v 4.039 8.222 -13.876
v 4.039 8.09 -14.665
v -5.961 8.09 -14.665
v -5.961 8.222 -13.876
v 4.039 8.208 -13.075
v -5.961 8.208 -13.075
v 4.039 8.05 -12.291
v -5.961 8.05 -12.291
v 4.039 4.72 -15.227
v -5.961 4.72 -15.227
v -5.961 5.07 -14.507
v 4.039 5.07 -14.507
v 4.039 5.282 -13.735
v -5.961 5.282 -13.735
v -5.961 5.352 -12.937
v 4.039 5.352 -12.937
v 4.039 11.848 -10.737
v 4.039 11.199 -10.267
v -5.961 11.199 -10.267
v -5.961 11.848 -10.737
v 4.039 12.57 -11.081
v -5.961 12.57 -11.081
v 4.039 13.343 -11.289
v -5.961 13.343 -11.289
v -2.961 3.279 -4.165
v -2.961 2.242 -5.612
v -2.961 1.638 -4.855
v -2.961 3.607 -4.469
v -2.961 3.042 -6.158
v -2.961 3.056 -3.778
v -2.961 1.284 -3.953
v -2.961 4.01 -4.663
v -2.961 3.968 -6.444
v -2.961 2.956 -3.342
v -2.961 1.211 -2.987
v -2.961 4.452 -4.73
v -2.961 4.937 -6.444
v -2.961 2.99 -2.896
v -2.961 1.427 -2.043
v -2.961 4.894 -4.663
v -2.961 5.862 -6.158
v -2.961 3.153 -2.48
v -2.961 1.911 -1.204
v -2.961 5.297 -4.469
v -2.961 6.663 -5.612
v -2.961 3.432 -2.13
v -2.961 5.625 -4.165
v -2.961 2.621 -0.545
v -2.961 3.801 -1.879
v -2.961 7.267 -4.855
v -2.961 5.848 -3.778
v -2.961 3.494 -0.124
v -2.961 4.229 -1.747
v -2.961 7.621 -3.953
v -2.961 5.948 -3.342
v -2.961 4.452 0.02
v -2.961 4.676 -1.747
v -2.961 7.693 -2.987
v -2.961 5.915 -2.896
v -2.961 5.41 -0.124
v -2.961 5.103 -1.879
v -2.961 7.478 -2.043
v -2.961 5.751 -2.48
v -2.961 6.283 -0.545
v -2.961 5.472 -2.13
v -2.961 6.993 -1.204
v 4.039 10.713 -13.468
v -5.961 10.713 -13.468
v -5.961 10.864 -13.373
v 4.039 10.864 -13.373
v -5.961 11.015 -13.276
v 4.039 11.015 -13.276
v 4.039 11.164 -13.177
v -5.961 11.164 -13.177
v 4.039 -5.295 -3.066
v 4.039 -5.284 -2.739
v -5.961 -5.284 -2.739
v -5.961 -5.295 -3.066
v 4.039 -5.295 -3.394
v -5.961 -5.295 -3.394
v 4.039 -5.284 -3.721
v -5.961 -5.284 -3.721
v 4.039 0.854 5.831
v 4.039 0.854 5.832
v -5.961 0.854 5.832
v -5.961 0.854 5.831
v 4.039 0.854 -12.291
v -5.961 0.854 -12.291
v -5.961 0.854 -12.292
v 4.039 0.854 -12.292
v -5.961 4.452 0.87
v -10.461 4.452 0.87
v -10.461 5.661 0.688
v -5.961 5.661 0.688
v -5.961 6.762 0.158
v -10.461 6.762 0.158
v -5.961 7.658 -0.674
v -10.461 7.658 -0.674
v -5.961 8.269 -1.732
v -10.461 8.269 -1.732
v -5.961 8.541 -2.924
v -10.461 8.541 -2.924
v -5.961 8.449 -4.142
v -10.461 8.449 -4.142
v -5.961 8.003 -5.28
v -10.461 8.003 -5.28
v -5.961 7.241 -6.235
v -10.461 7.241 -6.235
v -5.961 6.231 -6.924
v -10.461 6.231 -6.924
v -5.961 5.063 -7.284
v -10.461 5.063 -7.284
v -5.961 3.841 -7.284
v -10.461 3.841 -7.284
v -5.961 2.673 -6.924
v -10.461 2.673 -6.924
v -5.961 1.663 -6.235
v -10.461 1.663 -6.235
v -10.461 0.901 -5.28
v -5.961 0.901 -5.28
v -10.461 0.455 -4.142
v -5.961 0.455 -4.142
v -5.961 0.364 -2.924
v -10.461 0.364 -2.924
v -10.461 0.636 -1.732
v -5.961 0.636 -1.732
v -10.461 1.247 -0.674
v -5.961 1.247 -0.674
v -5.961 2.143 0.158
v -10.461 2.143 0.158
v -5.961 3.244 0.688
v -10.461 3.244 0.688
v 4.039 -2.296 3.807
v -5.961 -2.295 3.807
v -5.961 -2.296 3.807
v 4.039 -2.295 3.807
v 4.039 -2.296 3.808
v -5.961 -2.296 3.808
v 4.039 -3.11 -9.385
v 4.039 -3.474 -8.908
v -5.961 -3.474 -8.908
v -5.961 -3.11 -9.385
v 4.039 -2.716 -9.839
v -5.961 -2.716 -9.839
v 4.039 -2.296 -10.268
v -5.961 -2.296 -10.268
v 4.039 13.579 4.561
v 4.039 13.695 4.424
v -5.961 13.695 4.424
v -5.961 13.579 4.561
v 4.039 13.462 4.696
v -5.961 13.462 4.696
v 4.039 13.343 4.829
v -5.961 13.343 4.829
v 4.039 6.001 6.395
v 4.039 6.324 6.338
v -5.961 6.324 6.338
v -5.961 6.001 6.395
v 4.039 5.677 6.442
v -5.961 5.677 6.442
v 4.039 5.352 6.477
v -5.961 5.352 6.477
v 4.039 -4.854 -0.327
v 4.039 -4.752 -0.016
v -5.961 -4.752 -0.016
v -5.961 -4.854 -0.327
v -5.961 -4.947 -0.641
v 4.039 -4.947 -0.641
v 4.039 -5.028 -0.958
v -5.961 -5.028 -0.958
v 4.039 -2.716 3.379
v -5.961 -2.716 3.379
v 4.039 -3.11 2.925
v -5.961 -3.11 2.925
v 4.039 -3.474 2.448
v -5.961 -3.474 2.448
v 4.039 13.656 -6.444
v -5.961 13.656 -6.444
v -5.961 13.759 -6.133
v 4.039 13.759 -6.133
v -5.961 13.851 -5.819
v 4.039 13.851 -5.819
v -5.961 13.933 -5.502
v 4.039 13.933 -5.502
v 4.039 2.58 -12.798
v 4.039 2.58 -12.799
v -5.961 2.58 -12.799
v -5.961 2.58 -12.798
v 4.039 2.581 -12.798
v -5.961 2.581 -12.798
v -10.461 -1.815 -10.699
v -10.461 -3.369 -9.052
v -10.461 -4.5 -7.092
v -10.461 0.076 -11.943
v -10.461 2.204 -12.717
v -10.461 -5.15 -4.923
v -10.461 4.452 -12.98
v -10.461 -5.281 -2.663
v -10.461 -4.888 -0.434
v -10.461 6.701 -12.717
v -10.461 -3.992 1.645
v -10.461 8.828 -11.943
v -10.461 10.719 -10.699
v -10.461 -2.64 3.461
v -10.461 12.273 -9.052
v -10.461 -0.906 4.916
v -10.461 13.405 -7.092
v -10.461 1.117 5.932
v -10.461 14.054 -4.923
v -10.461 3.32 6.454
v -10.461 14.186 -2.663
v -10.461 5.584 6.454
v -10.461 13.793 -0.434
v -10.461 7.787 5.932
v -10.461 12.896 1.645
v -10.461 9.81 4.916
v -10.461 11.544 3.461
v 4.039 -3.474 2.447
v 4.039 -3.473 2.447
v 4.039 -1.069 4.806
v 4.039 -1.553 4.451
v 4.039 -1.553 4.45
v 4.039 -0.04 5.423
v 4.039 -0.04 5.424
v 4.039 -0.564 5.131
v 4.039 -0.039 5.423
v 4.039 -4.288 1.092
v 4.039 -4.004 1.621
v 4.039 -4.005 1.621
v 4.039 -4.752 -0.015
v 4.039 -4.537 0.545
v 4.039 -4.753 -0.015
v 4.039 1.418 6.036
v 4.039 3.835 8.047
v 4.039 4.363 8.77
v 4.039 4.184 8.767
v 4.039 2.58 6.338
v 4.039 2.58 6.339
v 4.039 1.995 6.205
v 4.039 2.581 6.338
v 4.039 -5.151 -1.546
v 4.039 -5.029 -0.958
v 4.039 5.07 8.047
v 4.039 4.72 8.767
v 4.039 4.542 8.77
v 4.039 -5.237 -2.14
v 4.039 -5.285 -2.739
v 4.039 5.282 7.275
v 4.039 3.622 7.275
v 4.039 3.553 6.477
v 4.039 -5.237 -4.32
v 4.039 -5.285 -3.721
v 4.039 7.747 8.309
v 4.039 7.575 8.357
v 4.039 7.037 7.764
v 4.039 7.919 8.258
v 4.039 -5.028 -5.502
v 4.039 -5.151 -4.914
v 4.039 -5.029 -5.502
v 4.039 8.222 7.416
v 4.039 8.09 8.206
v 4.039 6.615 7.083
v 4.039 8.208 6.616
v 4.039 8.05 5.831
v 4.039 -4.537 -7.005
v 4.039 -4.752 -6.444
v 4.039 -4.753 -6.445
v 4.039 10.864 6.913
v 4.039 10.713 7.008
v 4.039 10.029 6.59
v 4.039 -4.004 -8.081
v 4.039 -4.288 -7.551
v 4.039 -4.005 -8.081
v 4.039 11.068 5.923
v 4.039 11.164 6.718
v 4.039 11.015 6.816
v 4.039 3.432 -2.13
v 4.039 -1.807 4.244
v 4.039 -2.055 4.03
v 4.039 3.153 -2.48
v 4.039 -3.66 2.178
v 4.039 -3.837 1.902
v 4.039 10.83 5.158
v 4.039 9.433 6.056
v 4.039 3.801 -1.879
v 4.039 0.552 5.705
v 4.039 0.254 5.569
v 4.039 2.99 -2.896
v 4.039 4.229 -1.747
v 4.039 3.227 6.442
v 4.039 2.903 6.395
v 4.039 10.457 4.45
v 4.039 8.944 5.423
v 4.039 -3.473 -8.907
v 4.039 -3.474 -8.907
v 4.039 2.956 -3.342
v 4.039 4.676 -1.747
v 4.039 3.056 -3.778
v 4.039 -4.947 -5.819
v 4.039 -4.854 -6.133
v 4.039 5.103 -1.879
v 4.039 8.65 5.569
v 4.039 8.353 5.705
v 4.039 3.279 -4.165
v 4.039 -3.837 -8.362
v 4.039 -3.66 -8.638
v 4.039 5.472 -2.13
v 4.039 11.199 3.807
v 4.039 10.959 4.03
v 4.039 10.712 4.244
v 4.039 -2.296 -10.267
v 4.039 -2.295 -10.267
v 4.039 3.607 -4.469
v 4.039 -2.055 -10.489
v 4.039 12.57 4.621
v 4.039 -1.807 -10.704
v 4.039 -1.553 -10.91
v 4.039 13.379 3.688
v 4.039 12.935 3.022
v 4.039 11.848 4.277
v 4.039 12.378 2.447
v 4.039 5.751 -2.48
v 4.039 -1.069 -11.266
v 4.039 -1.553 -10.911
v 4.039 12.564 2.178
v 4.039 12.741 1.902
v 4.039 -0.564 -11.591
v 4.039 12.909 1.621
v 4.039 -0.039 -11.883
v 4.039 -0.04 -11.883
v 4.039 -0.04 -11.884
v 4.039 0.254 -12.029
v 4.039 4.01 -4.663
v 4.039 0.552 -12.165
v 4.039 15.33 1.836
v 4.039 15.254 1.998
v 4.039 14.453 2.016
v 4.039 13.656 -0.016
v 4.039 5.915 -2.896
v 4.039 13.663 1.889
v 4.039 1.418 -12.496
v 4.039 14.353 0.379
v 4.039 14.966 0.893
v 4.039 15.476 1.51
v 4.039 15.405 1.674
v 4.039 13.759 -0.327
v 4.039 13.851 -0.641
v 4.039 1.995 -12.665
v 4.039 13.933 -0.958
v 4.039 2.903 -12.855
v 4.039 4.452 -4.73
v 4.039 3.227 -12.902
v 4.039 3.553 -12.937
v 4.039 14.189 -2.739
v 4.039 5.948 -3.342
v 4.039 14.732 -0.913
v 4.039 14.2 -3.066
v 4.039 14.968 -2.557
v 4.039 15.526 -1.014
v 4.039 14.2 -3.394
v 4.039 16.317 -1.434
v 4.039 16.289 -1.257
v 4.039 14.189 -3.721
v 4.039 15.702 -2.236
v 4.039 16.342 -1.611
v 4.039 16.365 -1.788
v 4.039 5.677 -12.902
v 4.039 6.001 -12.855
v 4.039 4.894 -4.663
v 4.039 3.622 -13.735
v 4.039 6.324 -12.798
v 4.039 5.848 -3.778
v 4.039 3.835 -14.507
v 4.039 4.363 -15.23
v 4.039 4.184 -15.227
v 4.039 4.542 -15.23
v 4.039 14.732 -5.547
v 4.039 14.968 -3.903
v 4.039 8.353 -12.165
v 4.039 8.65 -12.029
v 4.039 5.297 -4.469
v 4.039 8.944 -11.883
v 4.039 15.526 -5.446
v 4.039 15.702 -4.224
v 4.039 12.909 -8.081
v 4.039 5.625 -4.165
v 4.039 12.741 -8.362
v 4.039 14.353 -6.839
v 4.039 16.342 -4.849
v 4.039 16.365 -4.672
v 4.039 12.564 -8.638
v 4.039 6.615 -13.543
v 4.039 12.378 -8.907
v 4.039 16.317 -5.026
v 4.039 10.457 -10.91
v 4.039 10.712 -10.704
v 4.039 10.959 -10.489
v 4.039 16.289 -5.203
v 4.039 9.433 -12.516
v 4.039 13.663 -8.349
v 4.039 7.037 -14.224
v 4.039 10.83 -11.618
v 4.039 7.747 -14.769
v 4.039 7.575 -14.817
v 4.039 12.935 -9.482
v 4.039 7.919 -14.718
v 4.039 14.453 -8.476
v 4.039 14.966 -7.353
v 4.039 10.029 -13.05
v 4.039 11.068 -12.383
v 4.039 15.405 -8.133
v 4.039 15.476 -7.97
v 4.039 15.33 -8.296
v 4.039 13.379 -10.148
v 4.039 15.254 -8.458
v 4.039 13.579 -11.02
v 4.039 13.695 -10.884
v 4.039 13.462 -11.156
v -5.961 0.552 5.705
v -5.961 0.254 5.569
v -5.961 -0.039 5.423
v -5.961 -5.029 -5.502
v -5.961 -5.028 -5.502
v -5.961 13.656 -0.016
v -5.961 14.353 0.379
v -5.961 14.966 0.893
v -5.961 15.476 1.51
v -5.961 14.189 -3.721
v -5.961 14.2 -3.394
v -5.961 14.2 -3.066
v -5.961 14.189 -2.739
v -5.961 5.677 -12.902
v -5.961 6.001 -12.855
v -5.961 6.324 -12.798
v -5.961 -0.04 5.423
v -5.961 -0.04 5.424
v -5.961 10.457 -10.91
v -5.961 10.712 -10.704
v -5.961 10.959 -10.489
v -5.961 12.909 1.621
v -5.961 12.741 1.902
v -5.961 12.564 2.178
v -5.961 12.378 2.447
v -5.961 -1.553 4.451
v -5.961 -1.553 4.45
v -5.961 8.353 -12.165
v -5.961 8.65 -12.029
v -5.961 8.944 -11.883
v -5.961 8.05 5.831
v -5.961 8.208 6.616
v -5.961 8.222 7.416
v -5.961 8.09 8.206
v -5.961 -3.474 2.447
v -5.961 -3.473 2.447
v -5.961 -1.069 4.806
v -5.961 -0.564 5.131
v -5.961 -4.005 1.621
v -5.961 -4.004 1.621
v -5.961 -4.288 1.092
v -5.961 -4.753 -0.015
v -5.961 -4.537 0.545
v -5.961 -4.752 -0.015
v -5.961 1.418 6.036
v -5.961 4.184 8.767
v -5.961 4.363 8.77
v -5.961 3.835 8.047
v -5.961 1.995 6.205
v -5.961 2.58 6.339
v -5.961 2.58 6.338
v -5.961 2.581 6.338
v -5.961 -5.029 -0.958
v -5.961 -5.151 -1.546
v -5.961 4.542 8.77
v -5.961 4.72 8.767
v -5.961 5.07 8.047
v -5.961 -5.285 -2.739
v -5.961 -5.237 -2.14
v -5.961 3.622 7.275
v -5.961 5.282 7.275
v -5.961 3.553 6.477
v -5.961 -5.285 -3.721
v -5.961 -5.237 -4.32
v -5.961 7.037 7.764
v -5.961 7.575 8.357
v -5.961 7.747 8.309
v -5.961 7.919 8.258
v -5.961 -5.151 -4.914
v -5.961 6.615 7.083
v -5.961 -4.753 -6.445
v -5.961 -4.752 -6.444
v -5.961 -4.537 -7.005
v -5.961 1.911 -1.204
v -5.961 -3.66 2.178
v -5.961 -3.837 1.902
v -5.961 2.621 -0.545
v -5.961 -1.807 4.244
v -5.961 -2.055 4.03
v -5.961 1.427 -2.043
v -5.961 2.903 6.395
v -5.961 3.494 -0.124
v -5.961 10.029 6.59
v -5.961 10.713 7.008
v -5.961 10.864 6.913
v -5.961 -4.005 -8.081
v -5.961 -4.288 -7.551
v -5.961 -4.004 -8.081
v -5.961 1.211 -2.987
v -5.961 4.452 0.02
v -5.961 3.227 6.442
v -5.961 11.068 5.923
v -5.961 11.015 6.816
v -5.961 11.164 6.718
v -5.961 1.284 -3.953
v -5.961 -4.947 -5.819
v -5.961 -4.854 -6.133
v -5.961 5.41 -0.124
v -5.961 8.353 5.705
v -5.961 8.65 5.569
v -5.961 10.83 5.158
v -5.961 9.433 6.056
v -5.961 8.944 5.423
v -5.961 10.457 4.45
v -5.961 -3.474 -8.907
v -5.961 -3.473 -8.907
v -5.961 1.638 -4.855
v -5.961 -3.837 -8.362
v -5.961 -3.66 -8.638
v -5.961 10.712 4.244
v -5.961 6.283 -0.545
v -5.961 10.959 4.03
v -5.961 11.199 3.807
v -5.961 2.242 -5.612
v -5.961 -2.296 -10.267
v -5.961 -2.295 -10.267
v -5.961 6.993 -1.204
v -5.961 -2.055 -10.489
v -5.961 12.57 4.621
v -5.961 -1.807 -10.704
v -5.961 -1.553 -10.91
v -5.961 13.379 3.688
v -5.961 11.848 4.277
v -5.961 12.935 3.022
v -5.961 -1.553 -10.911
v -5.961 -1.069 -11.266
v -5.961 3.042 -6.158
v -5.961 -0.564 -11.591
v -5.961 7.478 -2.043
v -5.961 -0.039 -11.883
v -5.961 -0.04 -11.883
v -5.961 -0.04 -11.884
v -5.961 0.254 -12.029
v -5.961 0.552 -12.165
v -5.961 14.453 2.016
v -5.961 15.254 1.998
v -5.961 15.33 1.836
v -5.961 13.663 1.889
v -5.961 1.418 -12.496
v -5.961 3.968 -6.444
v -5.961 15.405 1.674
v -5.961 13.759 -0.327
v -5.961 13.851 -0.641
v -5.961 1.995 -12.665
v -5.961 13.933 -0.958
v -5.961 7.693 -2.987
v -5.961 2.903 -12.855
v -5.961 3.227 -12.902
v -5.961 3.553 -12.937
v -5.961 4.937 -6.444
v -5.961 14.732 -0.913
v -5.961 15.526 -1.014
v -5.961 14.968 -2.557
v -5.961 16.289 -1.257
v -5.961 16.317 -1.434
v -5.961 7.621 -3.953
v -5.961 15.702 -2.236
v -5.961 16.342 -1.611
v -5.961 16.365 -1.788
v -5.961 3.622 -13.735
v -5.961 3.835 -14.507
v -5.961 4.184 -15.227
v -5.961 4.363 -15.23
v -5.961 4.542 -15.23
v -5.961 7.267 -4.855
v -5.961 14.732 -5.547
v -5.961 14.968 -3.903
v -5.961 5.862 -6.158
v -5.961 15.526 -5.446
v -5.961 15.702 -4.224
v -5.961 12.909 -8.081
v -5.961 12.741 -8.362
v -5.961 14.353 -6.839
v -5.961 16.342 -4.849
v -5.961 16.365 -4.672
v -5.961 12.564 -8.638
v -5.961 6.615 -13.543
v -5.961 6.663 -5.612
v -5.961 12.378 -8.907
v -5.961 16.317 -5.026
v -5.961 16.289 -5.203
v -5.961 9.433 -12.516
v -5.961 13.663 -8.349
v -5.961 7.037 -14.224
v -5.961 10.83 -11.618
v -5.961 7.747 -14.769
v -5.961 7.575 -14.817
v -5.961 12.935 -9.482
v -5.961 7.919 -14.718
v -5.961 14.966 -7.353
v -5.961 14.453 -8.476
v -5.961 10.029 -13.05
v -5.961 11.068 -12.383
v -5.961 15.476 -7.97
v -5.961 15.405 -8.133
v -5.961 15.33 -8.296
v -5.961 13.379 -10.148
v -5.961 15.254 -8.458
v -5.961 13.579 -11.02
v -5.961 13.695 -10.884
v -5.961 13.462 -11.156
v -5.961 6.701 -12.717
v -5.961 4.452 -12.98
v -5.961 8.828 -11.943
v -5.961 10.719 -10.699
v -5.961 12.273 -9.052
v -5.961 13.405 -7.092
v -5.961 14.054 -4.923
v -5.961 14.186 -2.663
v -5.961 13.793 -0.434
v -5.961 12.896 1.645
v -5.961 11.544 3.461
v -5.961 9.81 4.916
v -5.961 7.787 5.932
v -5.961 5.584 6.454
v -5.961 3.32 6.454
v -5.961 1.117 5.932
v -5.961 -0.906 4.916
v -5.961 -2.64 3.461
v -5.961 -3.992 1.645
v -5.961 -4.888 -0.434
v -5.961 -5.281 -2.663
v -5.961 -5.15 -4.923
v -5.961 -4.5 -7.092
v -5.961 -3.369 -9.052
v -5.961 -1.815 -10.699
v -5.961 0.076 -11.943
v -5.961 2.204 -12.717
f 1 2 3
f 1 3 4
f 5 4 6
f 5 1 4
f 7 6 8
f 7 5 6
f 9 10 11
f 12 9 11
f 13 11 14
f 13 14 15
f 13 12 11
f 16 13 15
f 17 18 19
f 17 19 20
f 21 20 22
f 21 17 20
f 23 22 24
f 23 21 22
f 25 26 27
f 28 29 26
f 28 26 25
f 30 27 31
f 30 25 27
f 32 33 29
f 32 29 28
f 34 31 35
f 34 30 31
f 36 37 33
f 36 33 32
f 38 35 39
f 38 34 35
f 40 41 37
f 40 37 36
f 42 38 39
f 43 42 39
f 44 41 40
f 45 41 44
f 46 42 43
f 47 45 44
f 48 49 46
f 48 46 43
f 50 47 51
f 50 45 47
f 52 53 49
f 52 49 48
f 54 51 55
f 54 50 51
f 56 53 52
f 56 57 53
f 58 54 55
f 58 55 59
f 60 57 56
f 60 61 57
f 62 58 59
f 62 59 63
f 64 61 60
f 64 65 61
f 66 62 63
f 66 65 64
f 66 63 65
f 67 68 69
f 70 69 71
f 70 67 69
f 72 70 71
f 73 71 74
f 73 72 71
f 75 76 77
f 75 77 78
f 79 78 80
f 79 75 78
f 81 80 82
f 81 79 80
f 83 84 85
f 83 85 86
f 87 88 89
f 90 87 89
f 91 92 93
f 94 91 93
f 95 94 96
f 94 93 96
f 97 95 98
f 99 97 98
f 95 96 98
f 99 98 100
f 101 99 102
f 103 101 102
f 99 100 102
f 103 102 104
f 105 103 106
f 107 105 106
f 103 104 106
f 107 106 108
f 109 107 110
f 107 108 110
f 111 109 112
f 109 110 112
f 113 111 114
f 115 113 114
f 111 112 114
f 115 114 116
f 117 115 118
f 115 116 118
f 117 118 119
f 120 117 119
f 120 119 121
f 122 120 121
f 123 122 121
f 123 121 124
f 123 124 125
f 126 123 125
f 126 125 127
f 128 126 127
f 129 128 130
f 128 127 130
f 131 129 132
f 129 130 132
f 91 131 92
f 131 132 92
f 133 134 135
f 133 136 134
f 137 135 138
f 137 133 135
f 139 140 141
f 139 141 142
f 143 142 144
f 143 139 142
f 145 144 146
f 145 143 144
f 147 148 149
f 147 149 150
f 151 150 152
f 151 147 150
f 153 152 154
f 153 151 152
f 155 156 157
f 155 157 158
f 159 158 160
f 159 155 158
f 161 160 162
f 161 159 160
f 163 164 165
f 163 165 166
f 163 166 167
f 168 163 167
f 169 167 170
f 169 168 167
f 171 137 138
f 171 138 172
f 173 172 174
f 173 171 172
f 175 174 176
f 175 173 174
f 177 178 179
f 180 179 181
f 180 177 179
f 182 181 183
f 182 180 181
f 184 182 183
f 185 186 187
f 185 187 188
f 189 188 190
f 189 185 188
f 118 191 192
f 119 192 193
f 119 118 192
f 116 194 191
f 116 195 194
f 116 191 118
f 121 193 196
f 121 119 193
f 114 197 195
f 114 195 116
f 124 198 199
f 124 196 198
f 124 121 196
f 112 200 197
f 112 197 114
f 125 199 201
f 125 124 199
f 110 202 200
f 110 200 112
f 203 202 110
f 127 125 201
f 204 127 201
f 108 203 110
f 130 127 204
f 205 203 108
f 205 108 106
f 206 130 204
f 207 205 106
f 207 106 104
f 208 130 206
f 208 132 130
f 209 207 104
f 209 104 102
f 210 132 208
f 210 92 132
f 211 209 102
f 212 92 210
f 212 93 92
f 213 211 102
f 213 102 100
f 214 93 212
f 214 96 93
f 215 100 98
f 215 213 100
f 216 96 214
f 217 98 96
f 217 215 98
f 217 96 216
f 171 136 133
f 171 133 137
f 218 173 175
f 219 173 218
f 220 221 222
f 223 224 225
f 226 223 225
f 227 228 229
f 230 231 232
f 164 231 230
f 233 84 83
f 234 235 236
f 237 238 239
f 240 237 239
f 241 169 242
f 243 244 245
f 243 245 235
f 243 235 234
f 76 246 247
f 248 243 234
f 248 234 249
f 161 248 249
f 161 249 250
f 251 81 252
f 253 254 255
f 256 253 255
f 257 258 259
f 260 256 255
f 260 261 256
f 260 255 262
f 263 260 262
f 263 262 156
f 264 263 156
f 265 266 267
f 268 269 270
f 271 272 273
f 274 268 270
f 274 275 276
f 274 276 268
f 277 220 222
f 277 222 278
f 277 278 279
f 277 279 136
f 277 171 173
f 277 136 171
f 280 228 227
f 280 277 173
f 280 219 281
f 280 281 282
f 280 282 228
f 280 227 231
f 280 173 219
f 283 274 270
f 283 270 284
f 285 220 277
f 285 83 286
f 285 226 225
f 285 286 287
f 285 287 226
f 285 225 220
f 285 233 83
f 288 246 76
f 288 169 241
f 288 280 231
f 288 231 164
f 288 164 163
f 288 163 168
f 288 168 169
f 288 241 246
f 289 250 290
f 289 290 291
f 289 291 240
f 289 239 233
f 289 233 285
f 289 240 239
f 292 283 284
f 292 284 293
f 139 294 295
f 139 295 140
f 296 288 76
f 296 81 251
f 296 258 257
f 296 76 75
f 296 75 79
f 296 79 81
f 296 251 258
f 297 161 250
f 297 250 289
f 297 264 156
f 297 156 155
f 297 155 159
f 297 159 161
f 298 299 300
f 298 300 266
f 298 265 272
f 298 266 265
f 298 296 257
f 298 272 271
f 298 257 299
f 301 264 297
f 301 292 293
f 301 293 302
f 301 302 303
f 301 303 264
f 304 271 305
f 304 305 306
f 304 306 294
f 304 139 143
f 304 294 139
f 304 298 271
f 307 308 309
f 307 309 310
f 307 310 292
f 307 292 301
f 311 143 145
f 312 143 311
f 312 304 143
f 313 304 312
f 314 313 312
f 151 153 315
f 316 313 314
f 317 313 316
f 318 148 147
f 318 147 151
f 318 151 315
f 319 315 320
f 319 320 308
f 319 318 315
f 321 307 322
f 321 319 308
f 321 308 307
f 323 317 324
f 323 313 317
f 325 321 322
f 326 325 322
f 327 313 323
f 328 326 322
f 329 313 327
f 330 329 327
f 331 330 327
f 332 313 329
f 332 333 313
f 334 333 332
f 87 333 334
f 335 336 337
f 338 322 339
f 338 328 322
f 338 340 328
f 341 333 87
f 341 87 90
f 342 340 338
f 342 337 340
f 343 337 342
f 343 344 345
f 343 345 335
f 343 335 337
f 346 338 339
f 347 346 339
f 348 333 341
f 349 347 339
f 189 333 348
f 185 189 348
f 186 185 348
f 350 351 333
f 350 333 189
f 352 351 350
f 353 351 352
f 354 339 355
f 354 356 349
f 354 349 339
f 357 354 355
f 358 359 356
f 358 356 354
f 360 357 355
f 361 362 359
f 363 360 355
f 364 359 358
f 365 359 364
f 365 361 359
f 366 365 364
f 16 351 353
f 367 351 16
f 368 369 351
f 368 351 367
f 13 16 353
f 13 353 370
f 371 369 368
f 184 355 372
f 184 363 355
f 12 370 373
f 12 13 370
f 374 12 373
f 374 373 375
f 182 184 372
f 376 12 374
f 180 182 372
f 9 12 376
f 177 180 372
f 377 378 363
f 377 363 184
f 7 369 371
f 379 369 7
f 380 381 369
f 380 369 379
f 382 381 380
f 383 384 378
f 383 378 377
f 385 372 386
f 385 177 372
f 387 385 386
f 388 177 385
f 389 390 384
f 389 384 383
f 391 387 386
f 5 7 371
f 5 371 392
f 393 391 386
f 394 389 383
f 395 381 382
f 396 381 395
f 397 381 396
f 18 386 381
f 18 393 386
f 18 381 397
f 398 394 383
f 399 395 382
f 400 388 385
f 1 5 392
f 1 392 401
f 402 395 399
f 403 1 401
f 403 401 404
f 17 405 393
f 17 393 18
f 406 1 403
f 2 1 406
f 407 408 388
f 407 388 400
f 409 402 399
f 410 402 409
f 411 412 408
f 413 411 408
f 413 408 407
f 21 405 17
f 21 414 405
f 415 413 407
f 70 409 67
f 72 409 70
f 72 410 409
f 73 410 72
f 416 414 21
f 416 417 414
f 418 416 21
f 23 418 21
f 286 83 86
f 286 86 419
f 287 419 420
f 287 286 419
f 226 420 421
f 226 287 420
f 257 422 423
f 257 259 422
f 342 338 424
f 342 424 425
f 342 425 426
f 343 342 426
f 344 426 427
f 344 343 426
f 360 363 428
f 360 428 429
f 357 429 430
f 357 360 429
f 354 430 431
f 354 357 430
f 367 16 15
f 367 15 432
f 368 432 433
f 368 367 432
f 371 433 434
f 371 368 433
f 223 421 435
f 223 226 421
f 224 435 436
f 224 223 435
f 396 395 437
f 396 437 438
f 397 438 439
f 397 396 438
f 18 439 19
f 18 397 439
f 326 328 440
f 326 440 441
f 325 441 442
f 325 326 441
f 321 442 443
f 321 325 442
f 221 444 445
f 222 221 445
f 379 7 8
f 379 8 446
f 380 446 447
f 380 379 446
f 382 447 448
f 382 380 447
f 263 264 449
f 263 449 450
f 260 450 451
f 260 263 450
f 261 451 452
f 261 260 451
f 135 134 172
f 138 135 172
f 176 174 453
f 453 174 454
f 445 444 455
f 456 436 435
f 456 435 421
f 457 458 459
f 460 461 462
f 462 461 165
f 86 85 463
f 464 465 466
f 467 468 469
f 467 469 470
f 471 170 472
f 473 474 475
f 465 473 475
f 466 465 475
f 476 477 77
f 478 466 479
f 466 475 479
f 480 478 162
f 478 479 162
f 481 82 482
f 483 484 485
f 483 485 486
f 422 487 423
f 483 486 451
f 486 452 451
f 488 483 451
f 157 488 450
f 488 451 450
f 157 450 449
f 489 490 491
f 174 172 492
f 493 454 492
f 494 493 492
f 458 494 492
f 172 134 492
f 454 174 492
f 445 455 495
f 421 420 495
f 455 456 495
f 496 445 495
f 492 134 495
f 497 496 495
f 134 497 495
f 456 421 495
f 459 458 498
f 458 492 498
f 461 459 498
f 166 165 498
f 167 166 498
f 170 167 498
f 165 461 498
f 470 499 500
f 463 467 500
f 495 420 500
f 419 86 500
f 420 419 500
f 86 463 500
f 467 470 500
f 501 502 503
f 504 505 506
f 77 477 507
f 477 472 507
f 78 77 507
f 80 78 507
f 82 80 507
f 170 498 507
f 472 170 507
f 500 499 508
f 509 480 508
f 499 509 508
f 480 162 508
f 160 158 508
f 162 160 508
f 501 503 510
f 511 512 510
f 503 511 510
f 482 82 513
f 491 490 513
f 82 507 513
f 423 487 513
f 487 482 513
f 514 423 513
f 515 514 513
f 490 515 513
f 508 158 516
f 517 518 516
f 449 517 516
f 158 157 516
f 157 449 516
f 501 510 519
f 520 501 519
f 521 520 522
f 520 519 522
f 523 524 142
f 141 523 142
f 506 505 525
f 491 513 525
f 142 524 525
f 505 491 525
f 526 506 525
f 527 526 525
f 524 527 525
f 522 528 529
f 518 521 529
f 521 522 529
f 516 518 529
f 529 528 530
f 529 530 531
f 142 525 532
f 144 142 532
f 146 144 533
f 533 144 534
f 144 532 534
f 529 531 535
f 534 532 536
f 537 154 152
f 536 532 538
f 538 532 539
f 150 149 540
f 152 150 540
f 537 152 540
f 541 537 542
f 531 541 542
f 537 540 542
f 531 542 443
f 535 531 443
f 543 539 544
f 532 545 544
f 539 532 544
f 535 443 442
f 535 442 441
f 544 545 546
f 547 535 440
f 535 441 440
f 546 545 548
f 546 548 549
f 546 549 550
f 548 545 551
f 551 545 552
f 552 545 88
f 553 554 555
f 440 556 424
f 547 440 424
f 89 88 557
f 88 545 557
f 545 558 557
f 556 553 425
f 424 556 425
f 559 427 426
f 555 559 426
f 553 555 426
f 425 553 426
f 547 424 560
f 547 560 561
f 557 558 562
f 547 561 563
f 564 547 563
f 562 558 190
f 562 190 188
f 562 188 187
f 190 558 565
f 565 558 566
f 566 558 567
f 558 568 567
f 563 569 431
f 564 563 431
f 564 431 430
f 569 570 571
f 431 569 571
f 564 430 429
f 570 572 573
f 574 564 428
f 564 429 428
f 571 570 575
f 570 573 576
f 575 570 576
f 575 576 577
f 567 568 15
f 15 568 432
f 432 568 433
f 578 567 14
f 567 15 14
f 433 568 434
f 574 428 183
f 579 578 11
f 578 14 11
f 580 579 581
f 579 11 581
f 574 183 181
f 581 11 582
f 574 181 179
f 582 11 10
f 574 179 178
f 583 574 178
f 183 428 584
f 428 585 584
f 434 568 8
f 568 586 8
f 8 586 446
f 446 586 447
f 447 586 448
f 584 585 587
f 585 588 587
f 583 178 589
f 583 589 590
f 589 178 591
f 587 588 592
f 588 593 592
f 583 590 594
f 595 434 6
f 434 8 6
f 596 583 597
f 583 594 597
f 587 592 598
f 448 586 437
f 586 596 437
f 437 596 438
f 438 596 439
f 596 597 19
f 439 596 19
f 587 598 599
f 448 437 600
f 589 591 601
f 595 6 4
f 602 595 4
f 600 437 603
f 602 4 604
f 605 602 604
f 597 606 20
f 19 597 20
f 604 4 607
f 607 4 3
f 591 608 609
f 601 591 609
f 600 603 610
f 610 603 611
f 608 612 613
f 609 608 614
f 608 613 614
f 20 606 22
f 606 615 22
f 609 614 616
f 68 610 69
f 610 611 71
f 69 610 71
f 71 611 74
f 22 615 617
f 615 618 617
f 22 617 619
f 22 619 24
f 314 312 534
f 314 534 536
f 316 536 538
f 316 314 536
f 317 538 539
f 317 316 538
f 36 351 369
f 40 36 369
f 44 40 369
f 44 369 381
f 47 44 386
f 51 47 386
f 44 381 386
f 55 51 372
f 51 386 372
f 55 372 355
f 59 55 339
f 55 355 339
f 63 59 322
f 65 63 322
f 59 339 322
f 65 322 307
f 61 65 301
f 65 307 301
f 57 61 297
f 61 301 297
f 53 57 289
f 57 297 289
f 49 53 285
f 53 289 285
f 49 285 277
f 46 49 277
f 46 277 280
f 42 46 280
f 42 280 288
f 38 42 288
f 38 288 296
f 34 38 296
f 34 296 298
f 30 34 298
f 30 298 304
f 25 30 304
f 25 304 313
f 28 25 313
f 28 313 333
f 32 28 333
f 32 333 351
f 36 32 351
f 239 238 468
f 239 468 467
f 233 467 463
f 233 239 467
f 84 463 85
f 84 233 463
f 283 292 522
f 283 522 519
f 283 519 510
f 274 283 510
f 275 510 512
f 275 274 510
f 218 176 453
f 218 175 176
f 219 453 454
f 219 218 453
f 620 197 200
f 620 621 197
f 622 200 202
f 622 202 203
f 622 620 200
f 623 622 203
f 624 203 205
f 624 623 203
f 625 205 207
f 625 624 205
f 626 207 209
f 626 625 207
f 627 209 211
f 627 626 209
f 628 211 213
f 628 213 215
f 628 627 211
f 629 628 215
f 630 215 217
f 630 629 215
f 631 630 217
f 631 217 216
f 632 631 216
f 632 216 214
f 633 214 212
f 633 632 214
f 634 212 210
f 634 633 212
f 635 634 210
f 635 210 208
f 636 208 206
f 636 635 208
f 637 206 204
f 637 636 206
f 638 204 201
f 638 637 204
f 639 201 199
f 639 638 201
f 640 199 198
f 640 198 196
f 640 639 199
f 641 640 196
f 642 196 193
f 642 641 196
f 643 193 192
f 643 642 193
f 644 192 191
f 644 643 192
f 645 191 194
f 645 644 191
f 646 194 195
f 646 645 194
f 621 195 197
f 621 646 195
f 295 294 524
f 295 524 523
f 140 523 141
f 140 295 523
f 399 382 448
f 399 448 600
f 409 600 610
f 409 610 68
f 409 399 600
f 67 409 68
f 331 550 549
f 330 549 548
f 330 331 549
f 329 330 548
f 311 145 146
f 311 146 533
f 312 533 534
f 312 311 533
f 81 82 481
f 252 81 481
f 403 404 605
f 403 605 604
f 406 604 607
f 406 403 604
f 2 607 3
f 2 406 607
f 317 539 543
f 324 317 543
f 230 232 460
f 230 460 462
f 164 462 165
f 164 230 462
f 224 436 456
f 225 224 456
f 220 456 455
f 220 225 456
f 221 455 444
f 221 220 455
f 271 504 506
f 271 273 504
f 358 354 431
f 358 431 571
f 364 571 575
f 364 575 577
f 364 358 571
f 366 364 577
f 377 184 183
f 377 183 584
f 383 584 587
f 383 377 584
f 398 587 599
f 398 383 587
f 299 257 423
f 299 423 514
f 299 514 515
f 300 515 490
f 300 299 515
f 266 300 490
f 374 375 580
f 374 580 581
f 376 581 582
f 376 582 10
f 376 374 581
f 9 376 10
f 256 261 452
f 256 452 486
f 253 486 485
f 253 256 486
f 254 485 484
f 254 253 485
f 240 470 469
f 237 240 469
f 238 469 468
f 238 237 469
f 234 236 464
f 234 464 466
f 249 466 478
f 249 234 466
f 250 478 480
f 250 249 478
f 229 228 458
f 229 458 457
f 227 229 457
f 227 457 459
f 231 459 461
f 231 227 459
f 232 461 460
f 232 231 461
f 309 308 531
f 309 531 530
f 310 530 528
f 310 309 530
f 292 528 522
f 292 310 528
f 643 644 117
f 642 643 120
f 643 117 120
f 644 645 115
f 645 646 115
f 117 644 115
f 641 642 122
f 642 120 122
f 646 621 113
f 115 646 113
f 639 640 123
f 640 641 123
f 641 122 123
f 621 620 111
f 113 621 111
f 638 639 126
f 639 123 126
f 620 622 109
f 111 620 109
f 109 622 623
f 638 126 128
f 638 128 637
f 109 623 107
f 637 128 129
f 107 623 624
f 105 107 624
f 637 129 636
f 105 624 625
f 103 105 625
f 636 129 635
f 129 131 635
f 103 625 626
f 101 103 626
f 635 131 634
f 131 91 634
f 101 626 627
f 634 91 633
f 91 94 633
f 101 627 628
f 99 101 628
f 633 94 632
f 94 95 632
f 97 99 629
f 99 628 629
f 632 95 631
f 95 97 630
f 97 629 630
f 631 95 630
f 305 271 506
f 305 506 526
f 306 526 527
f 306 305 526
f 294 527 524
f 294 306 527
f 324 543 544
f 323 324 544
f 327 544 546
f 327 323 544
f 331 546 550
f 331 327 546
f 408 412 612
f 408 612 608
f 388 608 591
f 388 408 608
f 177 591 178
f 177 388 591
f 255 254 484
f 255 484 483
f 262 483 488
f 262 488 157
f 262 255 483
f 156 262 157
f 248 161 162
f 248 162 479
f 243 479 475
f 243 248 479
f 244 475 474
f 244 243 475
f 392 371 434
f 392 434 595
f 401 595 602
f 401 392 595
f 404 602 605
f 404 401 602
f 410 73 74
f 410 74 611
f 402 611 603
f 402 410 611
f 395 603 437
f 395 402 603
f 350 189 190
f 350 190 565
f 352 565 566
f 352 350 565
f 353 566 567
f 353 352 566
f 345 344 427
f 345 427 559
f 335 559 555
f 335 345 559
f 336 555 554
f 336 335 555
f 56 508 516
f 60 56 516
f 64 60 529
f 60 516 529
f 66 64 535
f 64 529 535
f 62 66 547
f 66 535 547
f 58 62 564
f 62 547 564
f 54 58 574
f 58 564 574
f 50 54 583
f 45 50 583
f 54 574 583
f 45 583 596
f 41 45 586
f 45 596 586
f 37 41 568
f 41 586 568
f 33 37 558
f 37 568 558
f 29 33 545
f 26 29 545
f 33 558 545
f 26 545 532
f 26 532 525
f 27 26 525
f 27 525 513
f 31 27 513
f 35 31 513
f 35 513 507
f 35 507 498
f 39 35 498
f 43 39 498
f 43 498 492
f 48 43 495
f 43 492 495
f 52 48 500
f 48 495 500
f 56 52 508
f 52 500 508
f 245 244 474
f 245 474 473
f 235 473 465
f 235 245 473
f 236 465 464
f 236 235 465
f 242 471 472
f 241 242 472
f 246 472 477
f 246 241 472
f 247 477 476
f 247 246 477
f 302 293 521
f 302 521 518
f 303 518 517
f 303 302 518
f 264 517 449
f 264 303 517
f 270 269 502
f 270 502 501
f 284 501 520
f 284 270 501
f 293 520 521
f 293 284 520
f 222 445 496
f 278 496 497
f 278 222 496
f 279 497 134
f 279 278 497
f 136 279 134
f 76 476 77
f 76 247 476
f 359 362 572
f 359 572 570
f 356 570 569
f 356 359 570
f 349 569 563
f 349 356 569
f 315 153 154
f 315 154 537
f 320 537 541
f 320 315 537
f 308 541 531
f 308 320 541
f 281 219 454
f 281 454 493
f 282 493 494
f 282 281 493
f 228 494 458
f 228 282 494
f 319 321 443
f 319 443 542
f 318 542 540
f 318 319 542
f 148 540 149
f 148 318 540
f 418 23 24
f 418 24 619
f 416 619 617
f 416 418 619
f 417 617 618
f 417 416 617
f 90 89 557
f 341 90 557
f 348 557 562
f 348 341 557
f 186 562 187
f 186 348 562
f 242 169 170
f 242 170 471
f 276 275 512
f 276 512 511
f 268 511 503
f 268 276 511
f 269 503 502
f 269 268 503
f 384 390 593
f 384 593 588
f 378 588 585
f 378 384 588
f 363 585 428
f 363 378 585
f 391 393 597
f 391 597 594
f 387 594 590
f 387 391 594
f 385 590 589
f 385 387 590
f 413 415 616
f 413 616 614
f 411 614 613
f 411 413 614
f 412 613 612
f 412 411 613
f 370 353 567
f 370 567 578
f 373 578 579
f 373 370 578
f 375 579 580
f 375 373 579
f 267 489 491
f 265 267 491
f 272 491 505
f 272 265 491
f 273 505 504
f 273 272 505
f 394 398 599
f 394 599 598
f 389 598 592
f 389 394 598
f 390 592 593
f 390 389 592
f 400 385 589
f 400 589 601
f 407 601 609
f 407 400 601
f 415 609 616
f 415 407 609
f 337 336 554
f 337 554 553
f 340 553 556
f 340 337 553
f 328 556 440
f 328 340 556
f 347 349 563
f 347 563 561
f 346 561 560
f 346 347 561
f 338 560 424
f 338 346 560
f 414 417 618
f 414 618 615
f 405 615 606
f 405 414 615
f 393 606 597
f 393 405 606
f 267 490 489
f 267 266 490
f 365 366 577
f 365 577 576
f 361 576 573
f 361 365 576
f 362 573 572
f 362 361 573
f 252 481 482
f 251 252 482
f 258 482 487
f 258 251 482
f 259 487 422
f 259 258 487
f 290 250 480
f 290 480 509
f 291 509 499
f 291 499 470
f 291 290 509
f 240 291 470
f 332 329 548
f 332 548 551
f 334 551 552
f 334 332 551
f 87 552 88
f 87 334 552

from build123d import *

# Parameters (mm, degrees)
SKETCH5_R           = 1.5
BOSS_EXTRUDE1_DEPTH = 10
SKETCH10_W          = 4.5
SKETCH10_H          = 6.3
CUT_EXTRUDE1_DEPTH  = 10
SKETCH13_R          = 4.1
CUT_EXTRUDE2_DEPTH  = 4.5
SKETCH14_R          = 3.25
CUT_EXTRUDE3_DEPTH  = 3


with BuildPart() as part:
    # Sketch5 → Boss-Extrude1 (new body)
    with BuildSketch(Plane(origin=(4.038890567, 0, 0), x_dir=(0, 0, -1), z_dir=(1, 0, 0))):
        with BuildLine():
            ThreePointArc((-8.767047038, 4.183890551), (-7.665653193, 3.710793481), (-6.477446097, 3.552511658))
            ThreePointArc((-6.477446097, 3.552511658), (-6.419815651, 3.06474668), (-6.337692385, 2.580503238))
            ThreePointArc((-6.337692385, 2.580503238), (-7.433175602, 2.093876318), (-8.35666841, 1.329644499))
            ThreePointArc((-8.35666841, 1.329644499), (-8.283962098, 1.071383356), (-8.205500024, 0.814812257))
            ThreePointArc((-8.205500024, 0.814812257), (-7.015433522, 0.671177447), (-5.830764019, 0.854063773))
            ThreePointArc((-5.830764019, 0.854063773), (-5.638048737, 0.402293077), (-5.422824897, -0.039198306))
            ThreePointArc((-5.422824897, -0.039198306), (-6.3368347, -0.814746704), (-7.007610576, -1.808199754))
            ThreePointArc((-7.007610576, -1.808199754), (-6.865088808, -2.035515771), (-6.717520569, -2.259588617))
            ThreePointArc((-6.717520569, -2.259588617), (-5.535193519, -2.06212473), (-4.450036487, -1.552886617))
            ThreePointArc((-4.450036487, -1.552886617), (-4.137849015, -1.932063257), (-3.806960756, -2.295035573))
            ThreePointArc((-3.806960756, -2.295035573), (-4.465449507, -3.296675131), (-4.829166179, -4.438865755))
            ThreePointArc((-4.829166179, -4.438865755), (-4.628375221, -4.616820854), (-4.423655917, -4.790242398))
            ThreePointArc((-4.423655917, -4.790242398), (-3.344853426, -4.267677163), (-2.447121834, -3.473342707))
            ThreePointArc((-2.447121834, -3.473342707), (-2.040753744, -3.749206653), (-1.621007666, -4.004254045))
            ThreePointArc((-1.621007666, -4.004254045), (-1.970628521, -5.150837883), (-1.997819828, -6.349232589))
            ThreePointArc((-1.997819828, -6.349232589), (-1.75502657, -6.463409906), (-1.50974134, -6.572130566))
            ThreePointArc((-1.50974134, -6.572130566), (-0.62186157, -5.76679911), (0.015715707, -4.751720564))
            ThreePointArc((0.015715707, -4.751720564), (0.483342889, -4.901922961), (0.957941455, -5.028383006))
            ThreePointArc((0.957941455, -5.028383006), (0.945512697, -6.22702172), (1.257049634, -7.384533696))
            ThreePointArc((1.257049634, -7.384533696), (1.522175527, -7.425683264), (1.788155131, -7.460895139))
            ThreePointArc((1.788155131, -7.460895139), (2.413181441, -6.438040628), (2.738951684, -5.284453619))
            ThreePointArc((2.738951684, -5.284453619), (3.229953586, -5.296825962), (3.720955487, -5.284453619))
            ThreePointArc((3.720955487, -5.284453619), (4.04672573, -6.438040628), (4.671752041, -7.460895139))
            ThreePointArc((4.671752041, -7.460895139), (4.937731645, -7.425683264), (5.202857538, -7.384533696))
            ThreePointArc((5.202857538, -7.384533696), (5.514394474, -6.22702172), (5.501965716, -5.028383006))
            ThreePointArc((5.501965716, -5.028383006), (5.976564282, -4.901922961), (6.444191465, -4.751720564))
            ThreePointArc((6.444191465, -4.751720564), (7.081768742, -5.76679911), (7.969648512, -6.572130566))
            ThreePointArc((7.969648512, -6.572130566), (8.214933742, -6.463409906), (8.457727, -6.349232589))
            ThreePointArc((8.457727, -6.349232589), (8.430535693, -5.150837883), (8.080914837, -4.004254045))
            ThreePointArc((8.080914837, -4.004254045), (8.500660915, -3.749206653), (8.907029006, -3.473342707))
            ThreePointArc((8.907029006, -3.473342707), (9.804760597, -4.267677163), (10.883563088, -4.790242398))
            ThreePointArc((10.883563088, -4.790242398), (11.088282393, -4.616820854), (11.289073351, -4.438865755))
            ThreePointArc((11.289073351, -4.438865755), (10.925356678, -3.296675131), (10.266867928, -2.295035573))
            ThreePointArc((10.266867928, -2.295035573), (10.597756186, -1.932063257), (10.909943659, -1.552886617))
            ThreePointArc((10.909943659, -1.552886617), (11.995100691, -2.06212473), (13.17742774, -2.259588617))
            ThreePointArc((13.17742774, -2.259588617), (13.32499598, -2.035515771), (13.467517748, -1.808199754))
            ThreePointArc((13.467517748, -1.808199754), (12.796741871, -0.814746704), (11.882732068, -0.039198306))
            ThreePointArc((11.882732068, -0.039198306), (12.097955909, 0.402293077), (12.290671191, 0.854063773))
            ThreePointArc((12.290671191, 0.854063773), (13.475340694, 0.671177447), (14.665407196, 0.814812257))
            ThreePointArc((14.665407196, 0.814812257), (14.743869269, 1.071383356), (14.816575582, 1.329644499))
            ThreePointArc((14.816575582, 1.329644499), (13.893082774, 2.093876318), (12.797599556, 2.580503238))
            ThreePointArc((12.797599556, 2.580503238), (12.879722823, 3.06474668), (12.937353269, 3.552511658))
            ThreePointArc((12.937353269, 3.552511658), (14.125560365, 3.710793481), (15.22695421, 4.183890551))
            ThreePointArc((15.22695421, 4.183890551), (15.229953586, 4.452174038), (15.22695421, 4.720457526))
            ThreePointArc((15.22695421, 4.720457526), (14.125560365, 5.193554596), (12.937353269, 5.351836419))
            ThreePointArc((12.937353269, 5.351836419), (12.879722823, 5.839601397), (12.797599556, 6.323844839))
            ThreePointArc((12.797599556, 6.323844839), (13.893082774, 6.810471759), (14.816575582, 7.574703578))
            ThreePointArc((14.816575582, 7.574703578), (14.743869269, 7.832964721), (14.665407196, 8.08953582))
            ThreePointArc((14.665407196, 8.08953582), (13.475340694, 8.23317063), (12.290671191, 8.050284304))
            ThreePointArc((12.290671191, 8.050284304), (12.097955909, 8.502055), (11.882732068, 8.943546382))
            ThreePointArc((11.882732068, 8.943546382), (12.796741871, 9.719094781), (13.467517748, 10.712547831))
            ThreePointArc((13.467517748, 10.712547831), (13.32499598, 10.939863848), (13.17742774, 11.163936694))
            ThreePointArc((13.17742774, 11.163936694), (11.995100691, 10.966472807), (10.909943659, 10.457234694))
            ThreePointArc((10.909943659, 10.457234694), (10.597756186, 10.836411334), (10.266867928, 11.19938365))
            ThreePointArc((10.266867928, 11.19938365), (10.925356678, 12.201023208), (11.289073351, 13.343213832))
            ThreePointArc((11.289073351, 13.343213832), (11.088282393, 13.521168931), (10.883563088, 13.694590475))
            ThreePointArc((10.883563088, 13.694590475), (9.804760597, 13.17202524), (8.907029006, 12.377690783))
            ThreePointArc((8.907029006, 12.377690783), (8.500660915, 12.65355473), (8.080914837, 12.908602122))
            ThreePointArc((8.080914837, 12.908602122), (8.430535693, 14.05518596), (8.457727, 15.253580666))
            ThreePointArc((8.457727, 15.253580666), (8.214933742, 15.367757983), (7.969648512, 15.476478643))
            ThreePointArc((7.969648512, 15.476478643), (7.081768742, 14.671147187), (6.444191465, 13.656068641))
            ThreePointArc((6.444191465, 13.656068641), (5.976564282, 13.806271038), (5.501965716, 13.932731083))
            ThreePointArc((5.501965716, 13.932731083), (5.514394474, 15.131369796), (5.202857538, 16.288881773))
            ThreePointArc((5.202857538, 16.288881773), (4.937731645, 16.330031341), (4.671752041, 16.365243215))
            ThreePointArc((4.671752041, 16.365243215), (4.04672573, 15.342388705), (3.720955487, 14.188801696))
            ThreePointArc((3.720955487, 14.188801696), (3.229953586, 14.201174038), (2.738951684, 14.188801696))
            ThreePointArc((2.738951684, 14.188801696), (2.413181441, 15.342388705), (1.788155131, 16.365243215))
            ThreePointArc((1.788155131, 16.365243215), (1.522175527, 16.330031341), (1.257049634, 16.288881773))
            ThreePointArc((1.257049634, 16.288881773), (0.945512697, 15.131369796), (0.957941455, 13.932731083))
            ThreePointArc((0.957941455, 13.932731083), (0.483342889, 13.806271038), (0.015715707, 13.656068641))
            ThreePointArc((0.015715707, 13.656068641), (-0.62186157, 14.671147187), (-1.50974134, 15.476478643))
            ThreePointArc((-1.50974134, 15.476478643), (-1.75502657, 15.367757983), (-1.997819828, 15.253580666))
            ThreePointArc((-1.997819828, 15.253580666), (-1.970628521, 14.05518596), (-1.621007666, 12.908602122))
            ThreePointArc((-1.621007666, 12.908602122), (-2.040753744, 12.65355473), (-2.447121834, 12.377690783))
            ThreePointArc((-2.447121834, 12.377690783), (-3.344853426, 13.17202524), (-4.423655917, 13.694590475))
            ThreePointArc((-4.423655917, 13.694590475), (-4.628375221, 13.521168931), (-4.829166179, 13.343213832))
            ThreePointArc((-4.829166179, 13.343213832), (-4.465449507, 12.201023208), (-3.806960756, 11.19938365))
            ThreePointArc((-3.806960756, 11.19938365), (-4.137849015, 10.836411334), (-4.450036487, 10.457234694))
            ThreePointArc((-4.450036487, 10.457234694), (-5.535193519, 10.966472807), (-6.717520569, 11.163936694))
            ThreePointArc((-6.717520569, 11.163936694), (-6.865088808, 10.939863848), (-7.007610576, 10.712547831))
            ThreePointArc((-7.007610576, 10.712547831), (-6.3368347, 9.719094781), (-5.422824897, 8.943546382))
            ThreePointArc((-5.422824897, 8.943546382), (-5.638048737, 8.502055), (-5.830764019, 8.050284304))
            ThreePointArc((-5.830764019, 8.050284304), (-7.015433522, 8.23317063), (-8.205500024, 8.08953582))
            ThreePointArc((-8.205500024, 8.08953582), (-8.283962098, 7.832964721), (-8.35666841, 7.574703578))
            ThreePointArc((-8.35666841, 7.574703578), (-7.433175602, 6.810471759), (-6.337692385, 6.323844839))
            ThreePointArc((-6.337692385, 6.323844839), (-6.419815651, 5.839601397), (-6.477446097, 5.351836419))
            ThreePointArc((-6.477446097, 5.351836419), (-7.665653193, 5.193554596), (-8.767047038, 4.720457526))
            ThreePointArc((-8.767047038, 4.720457526), (-8.770046414, 4.452174038), (-8.767047038, 4.183890551))
        make_face()
        with Locations((3.229953586, 4.452174038)):
            Circle(SKETCH5_R, mode=Mode.SUBTRACT)
    extrude(amount=-BOSS_EXTRUDE1_DEPTH)

    # Sketch11 → Cut-Extrude1 (cut)
    with BuildSketch(Plane(origin=(4.038890567, 0, 0), x_dir=(0, 0, -1), z_dir=(1, 0, 0))):
        with BuildLine():
            Line((-9.20266534, 3.156031046), (-6.433509217, 3.156031046))
            ThreePointArc((-6.433509217, 3.156031046), (3.229953586, -5.297825962), (12.893416389, 3.156031046))
            Line((12.893416389, 3.156031046), (15.662572511, 3.156031046))
            ThreePointArc((15.662572511, 3.156031046), (3.229953586, -8.047825962), (-9.20266534, 3.156031046))
        make_face()
    extrude(amount=-CUT_EXTRUDE1_DEPTH, mode=Mode.SUBTRACT)

    # Sketch14 → Cut-Extrude3 (cut)
    with BuildSketch(Plane.ZY.offset(5.961109433)):
        with Locations((-3.229953586, 4.452174038)):
            Circle(SKETCH14_R)
    extrude(amount=-CUT_EXTRUDE3_DEPTH, mode=Mode.SUBTRACT)


with BuildPart() as body_2:
    # Sketch10 → Revolve2 (revolve)
    with BuildSketch(Plane.XY.offset(-3.229953586), mode=Mode.PRIVATE) as revolve2_sk:
        with Locations((-8.211109433, 11.052174038)):
            Rectangle(SKETCH10_W, SKETCH10_H)
    revolve(revolve2_sk.sketch.rotate(Axis((-10.461109433, 4.452174038, -3.229953586), (1, 0, 0)), 270), axis=Axis((-10.461109433, 4.452174038, -3.229953586), (1, 0, 0)))

    # Sketch13 → Cut-Extrude2 (cut)
    with BuildSketch(Plane.ZY.offset(10.461109433)):
        with Locations((-3.229953586, 4.452174038)):
            Circle(SKETCH13_R)
    extrude(amount=-CUT_EXTRUDE2_DEPTH, mode=Mode.SUBTRACT)


solid = Compound([part.part, body_2.part])
